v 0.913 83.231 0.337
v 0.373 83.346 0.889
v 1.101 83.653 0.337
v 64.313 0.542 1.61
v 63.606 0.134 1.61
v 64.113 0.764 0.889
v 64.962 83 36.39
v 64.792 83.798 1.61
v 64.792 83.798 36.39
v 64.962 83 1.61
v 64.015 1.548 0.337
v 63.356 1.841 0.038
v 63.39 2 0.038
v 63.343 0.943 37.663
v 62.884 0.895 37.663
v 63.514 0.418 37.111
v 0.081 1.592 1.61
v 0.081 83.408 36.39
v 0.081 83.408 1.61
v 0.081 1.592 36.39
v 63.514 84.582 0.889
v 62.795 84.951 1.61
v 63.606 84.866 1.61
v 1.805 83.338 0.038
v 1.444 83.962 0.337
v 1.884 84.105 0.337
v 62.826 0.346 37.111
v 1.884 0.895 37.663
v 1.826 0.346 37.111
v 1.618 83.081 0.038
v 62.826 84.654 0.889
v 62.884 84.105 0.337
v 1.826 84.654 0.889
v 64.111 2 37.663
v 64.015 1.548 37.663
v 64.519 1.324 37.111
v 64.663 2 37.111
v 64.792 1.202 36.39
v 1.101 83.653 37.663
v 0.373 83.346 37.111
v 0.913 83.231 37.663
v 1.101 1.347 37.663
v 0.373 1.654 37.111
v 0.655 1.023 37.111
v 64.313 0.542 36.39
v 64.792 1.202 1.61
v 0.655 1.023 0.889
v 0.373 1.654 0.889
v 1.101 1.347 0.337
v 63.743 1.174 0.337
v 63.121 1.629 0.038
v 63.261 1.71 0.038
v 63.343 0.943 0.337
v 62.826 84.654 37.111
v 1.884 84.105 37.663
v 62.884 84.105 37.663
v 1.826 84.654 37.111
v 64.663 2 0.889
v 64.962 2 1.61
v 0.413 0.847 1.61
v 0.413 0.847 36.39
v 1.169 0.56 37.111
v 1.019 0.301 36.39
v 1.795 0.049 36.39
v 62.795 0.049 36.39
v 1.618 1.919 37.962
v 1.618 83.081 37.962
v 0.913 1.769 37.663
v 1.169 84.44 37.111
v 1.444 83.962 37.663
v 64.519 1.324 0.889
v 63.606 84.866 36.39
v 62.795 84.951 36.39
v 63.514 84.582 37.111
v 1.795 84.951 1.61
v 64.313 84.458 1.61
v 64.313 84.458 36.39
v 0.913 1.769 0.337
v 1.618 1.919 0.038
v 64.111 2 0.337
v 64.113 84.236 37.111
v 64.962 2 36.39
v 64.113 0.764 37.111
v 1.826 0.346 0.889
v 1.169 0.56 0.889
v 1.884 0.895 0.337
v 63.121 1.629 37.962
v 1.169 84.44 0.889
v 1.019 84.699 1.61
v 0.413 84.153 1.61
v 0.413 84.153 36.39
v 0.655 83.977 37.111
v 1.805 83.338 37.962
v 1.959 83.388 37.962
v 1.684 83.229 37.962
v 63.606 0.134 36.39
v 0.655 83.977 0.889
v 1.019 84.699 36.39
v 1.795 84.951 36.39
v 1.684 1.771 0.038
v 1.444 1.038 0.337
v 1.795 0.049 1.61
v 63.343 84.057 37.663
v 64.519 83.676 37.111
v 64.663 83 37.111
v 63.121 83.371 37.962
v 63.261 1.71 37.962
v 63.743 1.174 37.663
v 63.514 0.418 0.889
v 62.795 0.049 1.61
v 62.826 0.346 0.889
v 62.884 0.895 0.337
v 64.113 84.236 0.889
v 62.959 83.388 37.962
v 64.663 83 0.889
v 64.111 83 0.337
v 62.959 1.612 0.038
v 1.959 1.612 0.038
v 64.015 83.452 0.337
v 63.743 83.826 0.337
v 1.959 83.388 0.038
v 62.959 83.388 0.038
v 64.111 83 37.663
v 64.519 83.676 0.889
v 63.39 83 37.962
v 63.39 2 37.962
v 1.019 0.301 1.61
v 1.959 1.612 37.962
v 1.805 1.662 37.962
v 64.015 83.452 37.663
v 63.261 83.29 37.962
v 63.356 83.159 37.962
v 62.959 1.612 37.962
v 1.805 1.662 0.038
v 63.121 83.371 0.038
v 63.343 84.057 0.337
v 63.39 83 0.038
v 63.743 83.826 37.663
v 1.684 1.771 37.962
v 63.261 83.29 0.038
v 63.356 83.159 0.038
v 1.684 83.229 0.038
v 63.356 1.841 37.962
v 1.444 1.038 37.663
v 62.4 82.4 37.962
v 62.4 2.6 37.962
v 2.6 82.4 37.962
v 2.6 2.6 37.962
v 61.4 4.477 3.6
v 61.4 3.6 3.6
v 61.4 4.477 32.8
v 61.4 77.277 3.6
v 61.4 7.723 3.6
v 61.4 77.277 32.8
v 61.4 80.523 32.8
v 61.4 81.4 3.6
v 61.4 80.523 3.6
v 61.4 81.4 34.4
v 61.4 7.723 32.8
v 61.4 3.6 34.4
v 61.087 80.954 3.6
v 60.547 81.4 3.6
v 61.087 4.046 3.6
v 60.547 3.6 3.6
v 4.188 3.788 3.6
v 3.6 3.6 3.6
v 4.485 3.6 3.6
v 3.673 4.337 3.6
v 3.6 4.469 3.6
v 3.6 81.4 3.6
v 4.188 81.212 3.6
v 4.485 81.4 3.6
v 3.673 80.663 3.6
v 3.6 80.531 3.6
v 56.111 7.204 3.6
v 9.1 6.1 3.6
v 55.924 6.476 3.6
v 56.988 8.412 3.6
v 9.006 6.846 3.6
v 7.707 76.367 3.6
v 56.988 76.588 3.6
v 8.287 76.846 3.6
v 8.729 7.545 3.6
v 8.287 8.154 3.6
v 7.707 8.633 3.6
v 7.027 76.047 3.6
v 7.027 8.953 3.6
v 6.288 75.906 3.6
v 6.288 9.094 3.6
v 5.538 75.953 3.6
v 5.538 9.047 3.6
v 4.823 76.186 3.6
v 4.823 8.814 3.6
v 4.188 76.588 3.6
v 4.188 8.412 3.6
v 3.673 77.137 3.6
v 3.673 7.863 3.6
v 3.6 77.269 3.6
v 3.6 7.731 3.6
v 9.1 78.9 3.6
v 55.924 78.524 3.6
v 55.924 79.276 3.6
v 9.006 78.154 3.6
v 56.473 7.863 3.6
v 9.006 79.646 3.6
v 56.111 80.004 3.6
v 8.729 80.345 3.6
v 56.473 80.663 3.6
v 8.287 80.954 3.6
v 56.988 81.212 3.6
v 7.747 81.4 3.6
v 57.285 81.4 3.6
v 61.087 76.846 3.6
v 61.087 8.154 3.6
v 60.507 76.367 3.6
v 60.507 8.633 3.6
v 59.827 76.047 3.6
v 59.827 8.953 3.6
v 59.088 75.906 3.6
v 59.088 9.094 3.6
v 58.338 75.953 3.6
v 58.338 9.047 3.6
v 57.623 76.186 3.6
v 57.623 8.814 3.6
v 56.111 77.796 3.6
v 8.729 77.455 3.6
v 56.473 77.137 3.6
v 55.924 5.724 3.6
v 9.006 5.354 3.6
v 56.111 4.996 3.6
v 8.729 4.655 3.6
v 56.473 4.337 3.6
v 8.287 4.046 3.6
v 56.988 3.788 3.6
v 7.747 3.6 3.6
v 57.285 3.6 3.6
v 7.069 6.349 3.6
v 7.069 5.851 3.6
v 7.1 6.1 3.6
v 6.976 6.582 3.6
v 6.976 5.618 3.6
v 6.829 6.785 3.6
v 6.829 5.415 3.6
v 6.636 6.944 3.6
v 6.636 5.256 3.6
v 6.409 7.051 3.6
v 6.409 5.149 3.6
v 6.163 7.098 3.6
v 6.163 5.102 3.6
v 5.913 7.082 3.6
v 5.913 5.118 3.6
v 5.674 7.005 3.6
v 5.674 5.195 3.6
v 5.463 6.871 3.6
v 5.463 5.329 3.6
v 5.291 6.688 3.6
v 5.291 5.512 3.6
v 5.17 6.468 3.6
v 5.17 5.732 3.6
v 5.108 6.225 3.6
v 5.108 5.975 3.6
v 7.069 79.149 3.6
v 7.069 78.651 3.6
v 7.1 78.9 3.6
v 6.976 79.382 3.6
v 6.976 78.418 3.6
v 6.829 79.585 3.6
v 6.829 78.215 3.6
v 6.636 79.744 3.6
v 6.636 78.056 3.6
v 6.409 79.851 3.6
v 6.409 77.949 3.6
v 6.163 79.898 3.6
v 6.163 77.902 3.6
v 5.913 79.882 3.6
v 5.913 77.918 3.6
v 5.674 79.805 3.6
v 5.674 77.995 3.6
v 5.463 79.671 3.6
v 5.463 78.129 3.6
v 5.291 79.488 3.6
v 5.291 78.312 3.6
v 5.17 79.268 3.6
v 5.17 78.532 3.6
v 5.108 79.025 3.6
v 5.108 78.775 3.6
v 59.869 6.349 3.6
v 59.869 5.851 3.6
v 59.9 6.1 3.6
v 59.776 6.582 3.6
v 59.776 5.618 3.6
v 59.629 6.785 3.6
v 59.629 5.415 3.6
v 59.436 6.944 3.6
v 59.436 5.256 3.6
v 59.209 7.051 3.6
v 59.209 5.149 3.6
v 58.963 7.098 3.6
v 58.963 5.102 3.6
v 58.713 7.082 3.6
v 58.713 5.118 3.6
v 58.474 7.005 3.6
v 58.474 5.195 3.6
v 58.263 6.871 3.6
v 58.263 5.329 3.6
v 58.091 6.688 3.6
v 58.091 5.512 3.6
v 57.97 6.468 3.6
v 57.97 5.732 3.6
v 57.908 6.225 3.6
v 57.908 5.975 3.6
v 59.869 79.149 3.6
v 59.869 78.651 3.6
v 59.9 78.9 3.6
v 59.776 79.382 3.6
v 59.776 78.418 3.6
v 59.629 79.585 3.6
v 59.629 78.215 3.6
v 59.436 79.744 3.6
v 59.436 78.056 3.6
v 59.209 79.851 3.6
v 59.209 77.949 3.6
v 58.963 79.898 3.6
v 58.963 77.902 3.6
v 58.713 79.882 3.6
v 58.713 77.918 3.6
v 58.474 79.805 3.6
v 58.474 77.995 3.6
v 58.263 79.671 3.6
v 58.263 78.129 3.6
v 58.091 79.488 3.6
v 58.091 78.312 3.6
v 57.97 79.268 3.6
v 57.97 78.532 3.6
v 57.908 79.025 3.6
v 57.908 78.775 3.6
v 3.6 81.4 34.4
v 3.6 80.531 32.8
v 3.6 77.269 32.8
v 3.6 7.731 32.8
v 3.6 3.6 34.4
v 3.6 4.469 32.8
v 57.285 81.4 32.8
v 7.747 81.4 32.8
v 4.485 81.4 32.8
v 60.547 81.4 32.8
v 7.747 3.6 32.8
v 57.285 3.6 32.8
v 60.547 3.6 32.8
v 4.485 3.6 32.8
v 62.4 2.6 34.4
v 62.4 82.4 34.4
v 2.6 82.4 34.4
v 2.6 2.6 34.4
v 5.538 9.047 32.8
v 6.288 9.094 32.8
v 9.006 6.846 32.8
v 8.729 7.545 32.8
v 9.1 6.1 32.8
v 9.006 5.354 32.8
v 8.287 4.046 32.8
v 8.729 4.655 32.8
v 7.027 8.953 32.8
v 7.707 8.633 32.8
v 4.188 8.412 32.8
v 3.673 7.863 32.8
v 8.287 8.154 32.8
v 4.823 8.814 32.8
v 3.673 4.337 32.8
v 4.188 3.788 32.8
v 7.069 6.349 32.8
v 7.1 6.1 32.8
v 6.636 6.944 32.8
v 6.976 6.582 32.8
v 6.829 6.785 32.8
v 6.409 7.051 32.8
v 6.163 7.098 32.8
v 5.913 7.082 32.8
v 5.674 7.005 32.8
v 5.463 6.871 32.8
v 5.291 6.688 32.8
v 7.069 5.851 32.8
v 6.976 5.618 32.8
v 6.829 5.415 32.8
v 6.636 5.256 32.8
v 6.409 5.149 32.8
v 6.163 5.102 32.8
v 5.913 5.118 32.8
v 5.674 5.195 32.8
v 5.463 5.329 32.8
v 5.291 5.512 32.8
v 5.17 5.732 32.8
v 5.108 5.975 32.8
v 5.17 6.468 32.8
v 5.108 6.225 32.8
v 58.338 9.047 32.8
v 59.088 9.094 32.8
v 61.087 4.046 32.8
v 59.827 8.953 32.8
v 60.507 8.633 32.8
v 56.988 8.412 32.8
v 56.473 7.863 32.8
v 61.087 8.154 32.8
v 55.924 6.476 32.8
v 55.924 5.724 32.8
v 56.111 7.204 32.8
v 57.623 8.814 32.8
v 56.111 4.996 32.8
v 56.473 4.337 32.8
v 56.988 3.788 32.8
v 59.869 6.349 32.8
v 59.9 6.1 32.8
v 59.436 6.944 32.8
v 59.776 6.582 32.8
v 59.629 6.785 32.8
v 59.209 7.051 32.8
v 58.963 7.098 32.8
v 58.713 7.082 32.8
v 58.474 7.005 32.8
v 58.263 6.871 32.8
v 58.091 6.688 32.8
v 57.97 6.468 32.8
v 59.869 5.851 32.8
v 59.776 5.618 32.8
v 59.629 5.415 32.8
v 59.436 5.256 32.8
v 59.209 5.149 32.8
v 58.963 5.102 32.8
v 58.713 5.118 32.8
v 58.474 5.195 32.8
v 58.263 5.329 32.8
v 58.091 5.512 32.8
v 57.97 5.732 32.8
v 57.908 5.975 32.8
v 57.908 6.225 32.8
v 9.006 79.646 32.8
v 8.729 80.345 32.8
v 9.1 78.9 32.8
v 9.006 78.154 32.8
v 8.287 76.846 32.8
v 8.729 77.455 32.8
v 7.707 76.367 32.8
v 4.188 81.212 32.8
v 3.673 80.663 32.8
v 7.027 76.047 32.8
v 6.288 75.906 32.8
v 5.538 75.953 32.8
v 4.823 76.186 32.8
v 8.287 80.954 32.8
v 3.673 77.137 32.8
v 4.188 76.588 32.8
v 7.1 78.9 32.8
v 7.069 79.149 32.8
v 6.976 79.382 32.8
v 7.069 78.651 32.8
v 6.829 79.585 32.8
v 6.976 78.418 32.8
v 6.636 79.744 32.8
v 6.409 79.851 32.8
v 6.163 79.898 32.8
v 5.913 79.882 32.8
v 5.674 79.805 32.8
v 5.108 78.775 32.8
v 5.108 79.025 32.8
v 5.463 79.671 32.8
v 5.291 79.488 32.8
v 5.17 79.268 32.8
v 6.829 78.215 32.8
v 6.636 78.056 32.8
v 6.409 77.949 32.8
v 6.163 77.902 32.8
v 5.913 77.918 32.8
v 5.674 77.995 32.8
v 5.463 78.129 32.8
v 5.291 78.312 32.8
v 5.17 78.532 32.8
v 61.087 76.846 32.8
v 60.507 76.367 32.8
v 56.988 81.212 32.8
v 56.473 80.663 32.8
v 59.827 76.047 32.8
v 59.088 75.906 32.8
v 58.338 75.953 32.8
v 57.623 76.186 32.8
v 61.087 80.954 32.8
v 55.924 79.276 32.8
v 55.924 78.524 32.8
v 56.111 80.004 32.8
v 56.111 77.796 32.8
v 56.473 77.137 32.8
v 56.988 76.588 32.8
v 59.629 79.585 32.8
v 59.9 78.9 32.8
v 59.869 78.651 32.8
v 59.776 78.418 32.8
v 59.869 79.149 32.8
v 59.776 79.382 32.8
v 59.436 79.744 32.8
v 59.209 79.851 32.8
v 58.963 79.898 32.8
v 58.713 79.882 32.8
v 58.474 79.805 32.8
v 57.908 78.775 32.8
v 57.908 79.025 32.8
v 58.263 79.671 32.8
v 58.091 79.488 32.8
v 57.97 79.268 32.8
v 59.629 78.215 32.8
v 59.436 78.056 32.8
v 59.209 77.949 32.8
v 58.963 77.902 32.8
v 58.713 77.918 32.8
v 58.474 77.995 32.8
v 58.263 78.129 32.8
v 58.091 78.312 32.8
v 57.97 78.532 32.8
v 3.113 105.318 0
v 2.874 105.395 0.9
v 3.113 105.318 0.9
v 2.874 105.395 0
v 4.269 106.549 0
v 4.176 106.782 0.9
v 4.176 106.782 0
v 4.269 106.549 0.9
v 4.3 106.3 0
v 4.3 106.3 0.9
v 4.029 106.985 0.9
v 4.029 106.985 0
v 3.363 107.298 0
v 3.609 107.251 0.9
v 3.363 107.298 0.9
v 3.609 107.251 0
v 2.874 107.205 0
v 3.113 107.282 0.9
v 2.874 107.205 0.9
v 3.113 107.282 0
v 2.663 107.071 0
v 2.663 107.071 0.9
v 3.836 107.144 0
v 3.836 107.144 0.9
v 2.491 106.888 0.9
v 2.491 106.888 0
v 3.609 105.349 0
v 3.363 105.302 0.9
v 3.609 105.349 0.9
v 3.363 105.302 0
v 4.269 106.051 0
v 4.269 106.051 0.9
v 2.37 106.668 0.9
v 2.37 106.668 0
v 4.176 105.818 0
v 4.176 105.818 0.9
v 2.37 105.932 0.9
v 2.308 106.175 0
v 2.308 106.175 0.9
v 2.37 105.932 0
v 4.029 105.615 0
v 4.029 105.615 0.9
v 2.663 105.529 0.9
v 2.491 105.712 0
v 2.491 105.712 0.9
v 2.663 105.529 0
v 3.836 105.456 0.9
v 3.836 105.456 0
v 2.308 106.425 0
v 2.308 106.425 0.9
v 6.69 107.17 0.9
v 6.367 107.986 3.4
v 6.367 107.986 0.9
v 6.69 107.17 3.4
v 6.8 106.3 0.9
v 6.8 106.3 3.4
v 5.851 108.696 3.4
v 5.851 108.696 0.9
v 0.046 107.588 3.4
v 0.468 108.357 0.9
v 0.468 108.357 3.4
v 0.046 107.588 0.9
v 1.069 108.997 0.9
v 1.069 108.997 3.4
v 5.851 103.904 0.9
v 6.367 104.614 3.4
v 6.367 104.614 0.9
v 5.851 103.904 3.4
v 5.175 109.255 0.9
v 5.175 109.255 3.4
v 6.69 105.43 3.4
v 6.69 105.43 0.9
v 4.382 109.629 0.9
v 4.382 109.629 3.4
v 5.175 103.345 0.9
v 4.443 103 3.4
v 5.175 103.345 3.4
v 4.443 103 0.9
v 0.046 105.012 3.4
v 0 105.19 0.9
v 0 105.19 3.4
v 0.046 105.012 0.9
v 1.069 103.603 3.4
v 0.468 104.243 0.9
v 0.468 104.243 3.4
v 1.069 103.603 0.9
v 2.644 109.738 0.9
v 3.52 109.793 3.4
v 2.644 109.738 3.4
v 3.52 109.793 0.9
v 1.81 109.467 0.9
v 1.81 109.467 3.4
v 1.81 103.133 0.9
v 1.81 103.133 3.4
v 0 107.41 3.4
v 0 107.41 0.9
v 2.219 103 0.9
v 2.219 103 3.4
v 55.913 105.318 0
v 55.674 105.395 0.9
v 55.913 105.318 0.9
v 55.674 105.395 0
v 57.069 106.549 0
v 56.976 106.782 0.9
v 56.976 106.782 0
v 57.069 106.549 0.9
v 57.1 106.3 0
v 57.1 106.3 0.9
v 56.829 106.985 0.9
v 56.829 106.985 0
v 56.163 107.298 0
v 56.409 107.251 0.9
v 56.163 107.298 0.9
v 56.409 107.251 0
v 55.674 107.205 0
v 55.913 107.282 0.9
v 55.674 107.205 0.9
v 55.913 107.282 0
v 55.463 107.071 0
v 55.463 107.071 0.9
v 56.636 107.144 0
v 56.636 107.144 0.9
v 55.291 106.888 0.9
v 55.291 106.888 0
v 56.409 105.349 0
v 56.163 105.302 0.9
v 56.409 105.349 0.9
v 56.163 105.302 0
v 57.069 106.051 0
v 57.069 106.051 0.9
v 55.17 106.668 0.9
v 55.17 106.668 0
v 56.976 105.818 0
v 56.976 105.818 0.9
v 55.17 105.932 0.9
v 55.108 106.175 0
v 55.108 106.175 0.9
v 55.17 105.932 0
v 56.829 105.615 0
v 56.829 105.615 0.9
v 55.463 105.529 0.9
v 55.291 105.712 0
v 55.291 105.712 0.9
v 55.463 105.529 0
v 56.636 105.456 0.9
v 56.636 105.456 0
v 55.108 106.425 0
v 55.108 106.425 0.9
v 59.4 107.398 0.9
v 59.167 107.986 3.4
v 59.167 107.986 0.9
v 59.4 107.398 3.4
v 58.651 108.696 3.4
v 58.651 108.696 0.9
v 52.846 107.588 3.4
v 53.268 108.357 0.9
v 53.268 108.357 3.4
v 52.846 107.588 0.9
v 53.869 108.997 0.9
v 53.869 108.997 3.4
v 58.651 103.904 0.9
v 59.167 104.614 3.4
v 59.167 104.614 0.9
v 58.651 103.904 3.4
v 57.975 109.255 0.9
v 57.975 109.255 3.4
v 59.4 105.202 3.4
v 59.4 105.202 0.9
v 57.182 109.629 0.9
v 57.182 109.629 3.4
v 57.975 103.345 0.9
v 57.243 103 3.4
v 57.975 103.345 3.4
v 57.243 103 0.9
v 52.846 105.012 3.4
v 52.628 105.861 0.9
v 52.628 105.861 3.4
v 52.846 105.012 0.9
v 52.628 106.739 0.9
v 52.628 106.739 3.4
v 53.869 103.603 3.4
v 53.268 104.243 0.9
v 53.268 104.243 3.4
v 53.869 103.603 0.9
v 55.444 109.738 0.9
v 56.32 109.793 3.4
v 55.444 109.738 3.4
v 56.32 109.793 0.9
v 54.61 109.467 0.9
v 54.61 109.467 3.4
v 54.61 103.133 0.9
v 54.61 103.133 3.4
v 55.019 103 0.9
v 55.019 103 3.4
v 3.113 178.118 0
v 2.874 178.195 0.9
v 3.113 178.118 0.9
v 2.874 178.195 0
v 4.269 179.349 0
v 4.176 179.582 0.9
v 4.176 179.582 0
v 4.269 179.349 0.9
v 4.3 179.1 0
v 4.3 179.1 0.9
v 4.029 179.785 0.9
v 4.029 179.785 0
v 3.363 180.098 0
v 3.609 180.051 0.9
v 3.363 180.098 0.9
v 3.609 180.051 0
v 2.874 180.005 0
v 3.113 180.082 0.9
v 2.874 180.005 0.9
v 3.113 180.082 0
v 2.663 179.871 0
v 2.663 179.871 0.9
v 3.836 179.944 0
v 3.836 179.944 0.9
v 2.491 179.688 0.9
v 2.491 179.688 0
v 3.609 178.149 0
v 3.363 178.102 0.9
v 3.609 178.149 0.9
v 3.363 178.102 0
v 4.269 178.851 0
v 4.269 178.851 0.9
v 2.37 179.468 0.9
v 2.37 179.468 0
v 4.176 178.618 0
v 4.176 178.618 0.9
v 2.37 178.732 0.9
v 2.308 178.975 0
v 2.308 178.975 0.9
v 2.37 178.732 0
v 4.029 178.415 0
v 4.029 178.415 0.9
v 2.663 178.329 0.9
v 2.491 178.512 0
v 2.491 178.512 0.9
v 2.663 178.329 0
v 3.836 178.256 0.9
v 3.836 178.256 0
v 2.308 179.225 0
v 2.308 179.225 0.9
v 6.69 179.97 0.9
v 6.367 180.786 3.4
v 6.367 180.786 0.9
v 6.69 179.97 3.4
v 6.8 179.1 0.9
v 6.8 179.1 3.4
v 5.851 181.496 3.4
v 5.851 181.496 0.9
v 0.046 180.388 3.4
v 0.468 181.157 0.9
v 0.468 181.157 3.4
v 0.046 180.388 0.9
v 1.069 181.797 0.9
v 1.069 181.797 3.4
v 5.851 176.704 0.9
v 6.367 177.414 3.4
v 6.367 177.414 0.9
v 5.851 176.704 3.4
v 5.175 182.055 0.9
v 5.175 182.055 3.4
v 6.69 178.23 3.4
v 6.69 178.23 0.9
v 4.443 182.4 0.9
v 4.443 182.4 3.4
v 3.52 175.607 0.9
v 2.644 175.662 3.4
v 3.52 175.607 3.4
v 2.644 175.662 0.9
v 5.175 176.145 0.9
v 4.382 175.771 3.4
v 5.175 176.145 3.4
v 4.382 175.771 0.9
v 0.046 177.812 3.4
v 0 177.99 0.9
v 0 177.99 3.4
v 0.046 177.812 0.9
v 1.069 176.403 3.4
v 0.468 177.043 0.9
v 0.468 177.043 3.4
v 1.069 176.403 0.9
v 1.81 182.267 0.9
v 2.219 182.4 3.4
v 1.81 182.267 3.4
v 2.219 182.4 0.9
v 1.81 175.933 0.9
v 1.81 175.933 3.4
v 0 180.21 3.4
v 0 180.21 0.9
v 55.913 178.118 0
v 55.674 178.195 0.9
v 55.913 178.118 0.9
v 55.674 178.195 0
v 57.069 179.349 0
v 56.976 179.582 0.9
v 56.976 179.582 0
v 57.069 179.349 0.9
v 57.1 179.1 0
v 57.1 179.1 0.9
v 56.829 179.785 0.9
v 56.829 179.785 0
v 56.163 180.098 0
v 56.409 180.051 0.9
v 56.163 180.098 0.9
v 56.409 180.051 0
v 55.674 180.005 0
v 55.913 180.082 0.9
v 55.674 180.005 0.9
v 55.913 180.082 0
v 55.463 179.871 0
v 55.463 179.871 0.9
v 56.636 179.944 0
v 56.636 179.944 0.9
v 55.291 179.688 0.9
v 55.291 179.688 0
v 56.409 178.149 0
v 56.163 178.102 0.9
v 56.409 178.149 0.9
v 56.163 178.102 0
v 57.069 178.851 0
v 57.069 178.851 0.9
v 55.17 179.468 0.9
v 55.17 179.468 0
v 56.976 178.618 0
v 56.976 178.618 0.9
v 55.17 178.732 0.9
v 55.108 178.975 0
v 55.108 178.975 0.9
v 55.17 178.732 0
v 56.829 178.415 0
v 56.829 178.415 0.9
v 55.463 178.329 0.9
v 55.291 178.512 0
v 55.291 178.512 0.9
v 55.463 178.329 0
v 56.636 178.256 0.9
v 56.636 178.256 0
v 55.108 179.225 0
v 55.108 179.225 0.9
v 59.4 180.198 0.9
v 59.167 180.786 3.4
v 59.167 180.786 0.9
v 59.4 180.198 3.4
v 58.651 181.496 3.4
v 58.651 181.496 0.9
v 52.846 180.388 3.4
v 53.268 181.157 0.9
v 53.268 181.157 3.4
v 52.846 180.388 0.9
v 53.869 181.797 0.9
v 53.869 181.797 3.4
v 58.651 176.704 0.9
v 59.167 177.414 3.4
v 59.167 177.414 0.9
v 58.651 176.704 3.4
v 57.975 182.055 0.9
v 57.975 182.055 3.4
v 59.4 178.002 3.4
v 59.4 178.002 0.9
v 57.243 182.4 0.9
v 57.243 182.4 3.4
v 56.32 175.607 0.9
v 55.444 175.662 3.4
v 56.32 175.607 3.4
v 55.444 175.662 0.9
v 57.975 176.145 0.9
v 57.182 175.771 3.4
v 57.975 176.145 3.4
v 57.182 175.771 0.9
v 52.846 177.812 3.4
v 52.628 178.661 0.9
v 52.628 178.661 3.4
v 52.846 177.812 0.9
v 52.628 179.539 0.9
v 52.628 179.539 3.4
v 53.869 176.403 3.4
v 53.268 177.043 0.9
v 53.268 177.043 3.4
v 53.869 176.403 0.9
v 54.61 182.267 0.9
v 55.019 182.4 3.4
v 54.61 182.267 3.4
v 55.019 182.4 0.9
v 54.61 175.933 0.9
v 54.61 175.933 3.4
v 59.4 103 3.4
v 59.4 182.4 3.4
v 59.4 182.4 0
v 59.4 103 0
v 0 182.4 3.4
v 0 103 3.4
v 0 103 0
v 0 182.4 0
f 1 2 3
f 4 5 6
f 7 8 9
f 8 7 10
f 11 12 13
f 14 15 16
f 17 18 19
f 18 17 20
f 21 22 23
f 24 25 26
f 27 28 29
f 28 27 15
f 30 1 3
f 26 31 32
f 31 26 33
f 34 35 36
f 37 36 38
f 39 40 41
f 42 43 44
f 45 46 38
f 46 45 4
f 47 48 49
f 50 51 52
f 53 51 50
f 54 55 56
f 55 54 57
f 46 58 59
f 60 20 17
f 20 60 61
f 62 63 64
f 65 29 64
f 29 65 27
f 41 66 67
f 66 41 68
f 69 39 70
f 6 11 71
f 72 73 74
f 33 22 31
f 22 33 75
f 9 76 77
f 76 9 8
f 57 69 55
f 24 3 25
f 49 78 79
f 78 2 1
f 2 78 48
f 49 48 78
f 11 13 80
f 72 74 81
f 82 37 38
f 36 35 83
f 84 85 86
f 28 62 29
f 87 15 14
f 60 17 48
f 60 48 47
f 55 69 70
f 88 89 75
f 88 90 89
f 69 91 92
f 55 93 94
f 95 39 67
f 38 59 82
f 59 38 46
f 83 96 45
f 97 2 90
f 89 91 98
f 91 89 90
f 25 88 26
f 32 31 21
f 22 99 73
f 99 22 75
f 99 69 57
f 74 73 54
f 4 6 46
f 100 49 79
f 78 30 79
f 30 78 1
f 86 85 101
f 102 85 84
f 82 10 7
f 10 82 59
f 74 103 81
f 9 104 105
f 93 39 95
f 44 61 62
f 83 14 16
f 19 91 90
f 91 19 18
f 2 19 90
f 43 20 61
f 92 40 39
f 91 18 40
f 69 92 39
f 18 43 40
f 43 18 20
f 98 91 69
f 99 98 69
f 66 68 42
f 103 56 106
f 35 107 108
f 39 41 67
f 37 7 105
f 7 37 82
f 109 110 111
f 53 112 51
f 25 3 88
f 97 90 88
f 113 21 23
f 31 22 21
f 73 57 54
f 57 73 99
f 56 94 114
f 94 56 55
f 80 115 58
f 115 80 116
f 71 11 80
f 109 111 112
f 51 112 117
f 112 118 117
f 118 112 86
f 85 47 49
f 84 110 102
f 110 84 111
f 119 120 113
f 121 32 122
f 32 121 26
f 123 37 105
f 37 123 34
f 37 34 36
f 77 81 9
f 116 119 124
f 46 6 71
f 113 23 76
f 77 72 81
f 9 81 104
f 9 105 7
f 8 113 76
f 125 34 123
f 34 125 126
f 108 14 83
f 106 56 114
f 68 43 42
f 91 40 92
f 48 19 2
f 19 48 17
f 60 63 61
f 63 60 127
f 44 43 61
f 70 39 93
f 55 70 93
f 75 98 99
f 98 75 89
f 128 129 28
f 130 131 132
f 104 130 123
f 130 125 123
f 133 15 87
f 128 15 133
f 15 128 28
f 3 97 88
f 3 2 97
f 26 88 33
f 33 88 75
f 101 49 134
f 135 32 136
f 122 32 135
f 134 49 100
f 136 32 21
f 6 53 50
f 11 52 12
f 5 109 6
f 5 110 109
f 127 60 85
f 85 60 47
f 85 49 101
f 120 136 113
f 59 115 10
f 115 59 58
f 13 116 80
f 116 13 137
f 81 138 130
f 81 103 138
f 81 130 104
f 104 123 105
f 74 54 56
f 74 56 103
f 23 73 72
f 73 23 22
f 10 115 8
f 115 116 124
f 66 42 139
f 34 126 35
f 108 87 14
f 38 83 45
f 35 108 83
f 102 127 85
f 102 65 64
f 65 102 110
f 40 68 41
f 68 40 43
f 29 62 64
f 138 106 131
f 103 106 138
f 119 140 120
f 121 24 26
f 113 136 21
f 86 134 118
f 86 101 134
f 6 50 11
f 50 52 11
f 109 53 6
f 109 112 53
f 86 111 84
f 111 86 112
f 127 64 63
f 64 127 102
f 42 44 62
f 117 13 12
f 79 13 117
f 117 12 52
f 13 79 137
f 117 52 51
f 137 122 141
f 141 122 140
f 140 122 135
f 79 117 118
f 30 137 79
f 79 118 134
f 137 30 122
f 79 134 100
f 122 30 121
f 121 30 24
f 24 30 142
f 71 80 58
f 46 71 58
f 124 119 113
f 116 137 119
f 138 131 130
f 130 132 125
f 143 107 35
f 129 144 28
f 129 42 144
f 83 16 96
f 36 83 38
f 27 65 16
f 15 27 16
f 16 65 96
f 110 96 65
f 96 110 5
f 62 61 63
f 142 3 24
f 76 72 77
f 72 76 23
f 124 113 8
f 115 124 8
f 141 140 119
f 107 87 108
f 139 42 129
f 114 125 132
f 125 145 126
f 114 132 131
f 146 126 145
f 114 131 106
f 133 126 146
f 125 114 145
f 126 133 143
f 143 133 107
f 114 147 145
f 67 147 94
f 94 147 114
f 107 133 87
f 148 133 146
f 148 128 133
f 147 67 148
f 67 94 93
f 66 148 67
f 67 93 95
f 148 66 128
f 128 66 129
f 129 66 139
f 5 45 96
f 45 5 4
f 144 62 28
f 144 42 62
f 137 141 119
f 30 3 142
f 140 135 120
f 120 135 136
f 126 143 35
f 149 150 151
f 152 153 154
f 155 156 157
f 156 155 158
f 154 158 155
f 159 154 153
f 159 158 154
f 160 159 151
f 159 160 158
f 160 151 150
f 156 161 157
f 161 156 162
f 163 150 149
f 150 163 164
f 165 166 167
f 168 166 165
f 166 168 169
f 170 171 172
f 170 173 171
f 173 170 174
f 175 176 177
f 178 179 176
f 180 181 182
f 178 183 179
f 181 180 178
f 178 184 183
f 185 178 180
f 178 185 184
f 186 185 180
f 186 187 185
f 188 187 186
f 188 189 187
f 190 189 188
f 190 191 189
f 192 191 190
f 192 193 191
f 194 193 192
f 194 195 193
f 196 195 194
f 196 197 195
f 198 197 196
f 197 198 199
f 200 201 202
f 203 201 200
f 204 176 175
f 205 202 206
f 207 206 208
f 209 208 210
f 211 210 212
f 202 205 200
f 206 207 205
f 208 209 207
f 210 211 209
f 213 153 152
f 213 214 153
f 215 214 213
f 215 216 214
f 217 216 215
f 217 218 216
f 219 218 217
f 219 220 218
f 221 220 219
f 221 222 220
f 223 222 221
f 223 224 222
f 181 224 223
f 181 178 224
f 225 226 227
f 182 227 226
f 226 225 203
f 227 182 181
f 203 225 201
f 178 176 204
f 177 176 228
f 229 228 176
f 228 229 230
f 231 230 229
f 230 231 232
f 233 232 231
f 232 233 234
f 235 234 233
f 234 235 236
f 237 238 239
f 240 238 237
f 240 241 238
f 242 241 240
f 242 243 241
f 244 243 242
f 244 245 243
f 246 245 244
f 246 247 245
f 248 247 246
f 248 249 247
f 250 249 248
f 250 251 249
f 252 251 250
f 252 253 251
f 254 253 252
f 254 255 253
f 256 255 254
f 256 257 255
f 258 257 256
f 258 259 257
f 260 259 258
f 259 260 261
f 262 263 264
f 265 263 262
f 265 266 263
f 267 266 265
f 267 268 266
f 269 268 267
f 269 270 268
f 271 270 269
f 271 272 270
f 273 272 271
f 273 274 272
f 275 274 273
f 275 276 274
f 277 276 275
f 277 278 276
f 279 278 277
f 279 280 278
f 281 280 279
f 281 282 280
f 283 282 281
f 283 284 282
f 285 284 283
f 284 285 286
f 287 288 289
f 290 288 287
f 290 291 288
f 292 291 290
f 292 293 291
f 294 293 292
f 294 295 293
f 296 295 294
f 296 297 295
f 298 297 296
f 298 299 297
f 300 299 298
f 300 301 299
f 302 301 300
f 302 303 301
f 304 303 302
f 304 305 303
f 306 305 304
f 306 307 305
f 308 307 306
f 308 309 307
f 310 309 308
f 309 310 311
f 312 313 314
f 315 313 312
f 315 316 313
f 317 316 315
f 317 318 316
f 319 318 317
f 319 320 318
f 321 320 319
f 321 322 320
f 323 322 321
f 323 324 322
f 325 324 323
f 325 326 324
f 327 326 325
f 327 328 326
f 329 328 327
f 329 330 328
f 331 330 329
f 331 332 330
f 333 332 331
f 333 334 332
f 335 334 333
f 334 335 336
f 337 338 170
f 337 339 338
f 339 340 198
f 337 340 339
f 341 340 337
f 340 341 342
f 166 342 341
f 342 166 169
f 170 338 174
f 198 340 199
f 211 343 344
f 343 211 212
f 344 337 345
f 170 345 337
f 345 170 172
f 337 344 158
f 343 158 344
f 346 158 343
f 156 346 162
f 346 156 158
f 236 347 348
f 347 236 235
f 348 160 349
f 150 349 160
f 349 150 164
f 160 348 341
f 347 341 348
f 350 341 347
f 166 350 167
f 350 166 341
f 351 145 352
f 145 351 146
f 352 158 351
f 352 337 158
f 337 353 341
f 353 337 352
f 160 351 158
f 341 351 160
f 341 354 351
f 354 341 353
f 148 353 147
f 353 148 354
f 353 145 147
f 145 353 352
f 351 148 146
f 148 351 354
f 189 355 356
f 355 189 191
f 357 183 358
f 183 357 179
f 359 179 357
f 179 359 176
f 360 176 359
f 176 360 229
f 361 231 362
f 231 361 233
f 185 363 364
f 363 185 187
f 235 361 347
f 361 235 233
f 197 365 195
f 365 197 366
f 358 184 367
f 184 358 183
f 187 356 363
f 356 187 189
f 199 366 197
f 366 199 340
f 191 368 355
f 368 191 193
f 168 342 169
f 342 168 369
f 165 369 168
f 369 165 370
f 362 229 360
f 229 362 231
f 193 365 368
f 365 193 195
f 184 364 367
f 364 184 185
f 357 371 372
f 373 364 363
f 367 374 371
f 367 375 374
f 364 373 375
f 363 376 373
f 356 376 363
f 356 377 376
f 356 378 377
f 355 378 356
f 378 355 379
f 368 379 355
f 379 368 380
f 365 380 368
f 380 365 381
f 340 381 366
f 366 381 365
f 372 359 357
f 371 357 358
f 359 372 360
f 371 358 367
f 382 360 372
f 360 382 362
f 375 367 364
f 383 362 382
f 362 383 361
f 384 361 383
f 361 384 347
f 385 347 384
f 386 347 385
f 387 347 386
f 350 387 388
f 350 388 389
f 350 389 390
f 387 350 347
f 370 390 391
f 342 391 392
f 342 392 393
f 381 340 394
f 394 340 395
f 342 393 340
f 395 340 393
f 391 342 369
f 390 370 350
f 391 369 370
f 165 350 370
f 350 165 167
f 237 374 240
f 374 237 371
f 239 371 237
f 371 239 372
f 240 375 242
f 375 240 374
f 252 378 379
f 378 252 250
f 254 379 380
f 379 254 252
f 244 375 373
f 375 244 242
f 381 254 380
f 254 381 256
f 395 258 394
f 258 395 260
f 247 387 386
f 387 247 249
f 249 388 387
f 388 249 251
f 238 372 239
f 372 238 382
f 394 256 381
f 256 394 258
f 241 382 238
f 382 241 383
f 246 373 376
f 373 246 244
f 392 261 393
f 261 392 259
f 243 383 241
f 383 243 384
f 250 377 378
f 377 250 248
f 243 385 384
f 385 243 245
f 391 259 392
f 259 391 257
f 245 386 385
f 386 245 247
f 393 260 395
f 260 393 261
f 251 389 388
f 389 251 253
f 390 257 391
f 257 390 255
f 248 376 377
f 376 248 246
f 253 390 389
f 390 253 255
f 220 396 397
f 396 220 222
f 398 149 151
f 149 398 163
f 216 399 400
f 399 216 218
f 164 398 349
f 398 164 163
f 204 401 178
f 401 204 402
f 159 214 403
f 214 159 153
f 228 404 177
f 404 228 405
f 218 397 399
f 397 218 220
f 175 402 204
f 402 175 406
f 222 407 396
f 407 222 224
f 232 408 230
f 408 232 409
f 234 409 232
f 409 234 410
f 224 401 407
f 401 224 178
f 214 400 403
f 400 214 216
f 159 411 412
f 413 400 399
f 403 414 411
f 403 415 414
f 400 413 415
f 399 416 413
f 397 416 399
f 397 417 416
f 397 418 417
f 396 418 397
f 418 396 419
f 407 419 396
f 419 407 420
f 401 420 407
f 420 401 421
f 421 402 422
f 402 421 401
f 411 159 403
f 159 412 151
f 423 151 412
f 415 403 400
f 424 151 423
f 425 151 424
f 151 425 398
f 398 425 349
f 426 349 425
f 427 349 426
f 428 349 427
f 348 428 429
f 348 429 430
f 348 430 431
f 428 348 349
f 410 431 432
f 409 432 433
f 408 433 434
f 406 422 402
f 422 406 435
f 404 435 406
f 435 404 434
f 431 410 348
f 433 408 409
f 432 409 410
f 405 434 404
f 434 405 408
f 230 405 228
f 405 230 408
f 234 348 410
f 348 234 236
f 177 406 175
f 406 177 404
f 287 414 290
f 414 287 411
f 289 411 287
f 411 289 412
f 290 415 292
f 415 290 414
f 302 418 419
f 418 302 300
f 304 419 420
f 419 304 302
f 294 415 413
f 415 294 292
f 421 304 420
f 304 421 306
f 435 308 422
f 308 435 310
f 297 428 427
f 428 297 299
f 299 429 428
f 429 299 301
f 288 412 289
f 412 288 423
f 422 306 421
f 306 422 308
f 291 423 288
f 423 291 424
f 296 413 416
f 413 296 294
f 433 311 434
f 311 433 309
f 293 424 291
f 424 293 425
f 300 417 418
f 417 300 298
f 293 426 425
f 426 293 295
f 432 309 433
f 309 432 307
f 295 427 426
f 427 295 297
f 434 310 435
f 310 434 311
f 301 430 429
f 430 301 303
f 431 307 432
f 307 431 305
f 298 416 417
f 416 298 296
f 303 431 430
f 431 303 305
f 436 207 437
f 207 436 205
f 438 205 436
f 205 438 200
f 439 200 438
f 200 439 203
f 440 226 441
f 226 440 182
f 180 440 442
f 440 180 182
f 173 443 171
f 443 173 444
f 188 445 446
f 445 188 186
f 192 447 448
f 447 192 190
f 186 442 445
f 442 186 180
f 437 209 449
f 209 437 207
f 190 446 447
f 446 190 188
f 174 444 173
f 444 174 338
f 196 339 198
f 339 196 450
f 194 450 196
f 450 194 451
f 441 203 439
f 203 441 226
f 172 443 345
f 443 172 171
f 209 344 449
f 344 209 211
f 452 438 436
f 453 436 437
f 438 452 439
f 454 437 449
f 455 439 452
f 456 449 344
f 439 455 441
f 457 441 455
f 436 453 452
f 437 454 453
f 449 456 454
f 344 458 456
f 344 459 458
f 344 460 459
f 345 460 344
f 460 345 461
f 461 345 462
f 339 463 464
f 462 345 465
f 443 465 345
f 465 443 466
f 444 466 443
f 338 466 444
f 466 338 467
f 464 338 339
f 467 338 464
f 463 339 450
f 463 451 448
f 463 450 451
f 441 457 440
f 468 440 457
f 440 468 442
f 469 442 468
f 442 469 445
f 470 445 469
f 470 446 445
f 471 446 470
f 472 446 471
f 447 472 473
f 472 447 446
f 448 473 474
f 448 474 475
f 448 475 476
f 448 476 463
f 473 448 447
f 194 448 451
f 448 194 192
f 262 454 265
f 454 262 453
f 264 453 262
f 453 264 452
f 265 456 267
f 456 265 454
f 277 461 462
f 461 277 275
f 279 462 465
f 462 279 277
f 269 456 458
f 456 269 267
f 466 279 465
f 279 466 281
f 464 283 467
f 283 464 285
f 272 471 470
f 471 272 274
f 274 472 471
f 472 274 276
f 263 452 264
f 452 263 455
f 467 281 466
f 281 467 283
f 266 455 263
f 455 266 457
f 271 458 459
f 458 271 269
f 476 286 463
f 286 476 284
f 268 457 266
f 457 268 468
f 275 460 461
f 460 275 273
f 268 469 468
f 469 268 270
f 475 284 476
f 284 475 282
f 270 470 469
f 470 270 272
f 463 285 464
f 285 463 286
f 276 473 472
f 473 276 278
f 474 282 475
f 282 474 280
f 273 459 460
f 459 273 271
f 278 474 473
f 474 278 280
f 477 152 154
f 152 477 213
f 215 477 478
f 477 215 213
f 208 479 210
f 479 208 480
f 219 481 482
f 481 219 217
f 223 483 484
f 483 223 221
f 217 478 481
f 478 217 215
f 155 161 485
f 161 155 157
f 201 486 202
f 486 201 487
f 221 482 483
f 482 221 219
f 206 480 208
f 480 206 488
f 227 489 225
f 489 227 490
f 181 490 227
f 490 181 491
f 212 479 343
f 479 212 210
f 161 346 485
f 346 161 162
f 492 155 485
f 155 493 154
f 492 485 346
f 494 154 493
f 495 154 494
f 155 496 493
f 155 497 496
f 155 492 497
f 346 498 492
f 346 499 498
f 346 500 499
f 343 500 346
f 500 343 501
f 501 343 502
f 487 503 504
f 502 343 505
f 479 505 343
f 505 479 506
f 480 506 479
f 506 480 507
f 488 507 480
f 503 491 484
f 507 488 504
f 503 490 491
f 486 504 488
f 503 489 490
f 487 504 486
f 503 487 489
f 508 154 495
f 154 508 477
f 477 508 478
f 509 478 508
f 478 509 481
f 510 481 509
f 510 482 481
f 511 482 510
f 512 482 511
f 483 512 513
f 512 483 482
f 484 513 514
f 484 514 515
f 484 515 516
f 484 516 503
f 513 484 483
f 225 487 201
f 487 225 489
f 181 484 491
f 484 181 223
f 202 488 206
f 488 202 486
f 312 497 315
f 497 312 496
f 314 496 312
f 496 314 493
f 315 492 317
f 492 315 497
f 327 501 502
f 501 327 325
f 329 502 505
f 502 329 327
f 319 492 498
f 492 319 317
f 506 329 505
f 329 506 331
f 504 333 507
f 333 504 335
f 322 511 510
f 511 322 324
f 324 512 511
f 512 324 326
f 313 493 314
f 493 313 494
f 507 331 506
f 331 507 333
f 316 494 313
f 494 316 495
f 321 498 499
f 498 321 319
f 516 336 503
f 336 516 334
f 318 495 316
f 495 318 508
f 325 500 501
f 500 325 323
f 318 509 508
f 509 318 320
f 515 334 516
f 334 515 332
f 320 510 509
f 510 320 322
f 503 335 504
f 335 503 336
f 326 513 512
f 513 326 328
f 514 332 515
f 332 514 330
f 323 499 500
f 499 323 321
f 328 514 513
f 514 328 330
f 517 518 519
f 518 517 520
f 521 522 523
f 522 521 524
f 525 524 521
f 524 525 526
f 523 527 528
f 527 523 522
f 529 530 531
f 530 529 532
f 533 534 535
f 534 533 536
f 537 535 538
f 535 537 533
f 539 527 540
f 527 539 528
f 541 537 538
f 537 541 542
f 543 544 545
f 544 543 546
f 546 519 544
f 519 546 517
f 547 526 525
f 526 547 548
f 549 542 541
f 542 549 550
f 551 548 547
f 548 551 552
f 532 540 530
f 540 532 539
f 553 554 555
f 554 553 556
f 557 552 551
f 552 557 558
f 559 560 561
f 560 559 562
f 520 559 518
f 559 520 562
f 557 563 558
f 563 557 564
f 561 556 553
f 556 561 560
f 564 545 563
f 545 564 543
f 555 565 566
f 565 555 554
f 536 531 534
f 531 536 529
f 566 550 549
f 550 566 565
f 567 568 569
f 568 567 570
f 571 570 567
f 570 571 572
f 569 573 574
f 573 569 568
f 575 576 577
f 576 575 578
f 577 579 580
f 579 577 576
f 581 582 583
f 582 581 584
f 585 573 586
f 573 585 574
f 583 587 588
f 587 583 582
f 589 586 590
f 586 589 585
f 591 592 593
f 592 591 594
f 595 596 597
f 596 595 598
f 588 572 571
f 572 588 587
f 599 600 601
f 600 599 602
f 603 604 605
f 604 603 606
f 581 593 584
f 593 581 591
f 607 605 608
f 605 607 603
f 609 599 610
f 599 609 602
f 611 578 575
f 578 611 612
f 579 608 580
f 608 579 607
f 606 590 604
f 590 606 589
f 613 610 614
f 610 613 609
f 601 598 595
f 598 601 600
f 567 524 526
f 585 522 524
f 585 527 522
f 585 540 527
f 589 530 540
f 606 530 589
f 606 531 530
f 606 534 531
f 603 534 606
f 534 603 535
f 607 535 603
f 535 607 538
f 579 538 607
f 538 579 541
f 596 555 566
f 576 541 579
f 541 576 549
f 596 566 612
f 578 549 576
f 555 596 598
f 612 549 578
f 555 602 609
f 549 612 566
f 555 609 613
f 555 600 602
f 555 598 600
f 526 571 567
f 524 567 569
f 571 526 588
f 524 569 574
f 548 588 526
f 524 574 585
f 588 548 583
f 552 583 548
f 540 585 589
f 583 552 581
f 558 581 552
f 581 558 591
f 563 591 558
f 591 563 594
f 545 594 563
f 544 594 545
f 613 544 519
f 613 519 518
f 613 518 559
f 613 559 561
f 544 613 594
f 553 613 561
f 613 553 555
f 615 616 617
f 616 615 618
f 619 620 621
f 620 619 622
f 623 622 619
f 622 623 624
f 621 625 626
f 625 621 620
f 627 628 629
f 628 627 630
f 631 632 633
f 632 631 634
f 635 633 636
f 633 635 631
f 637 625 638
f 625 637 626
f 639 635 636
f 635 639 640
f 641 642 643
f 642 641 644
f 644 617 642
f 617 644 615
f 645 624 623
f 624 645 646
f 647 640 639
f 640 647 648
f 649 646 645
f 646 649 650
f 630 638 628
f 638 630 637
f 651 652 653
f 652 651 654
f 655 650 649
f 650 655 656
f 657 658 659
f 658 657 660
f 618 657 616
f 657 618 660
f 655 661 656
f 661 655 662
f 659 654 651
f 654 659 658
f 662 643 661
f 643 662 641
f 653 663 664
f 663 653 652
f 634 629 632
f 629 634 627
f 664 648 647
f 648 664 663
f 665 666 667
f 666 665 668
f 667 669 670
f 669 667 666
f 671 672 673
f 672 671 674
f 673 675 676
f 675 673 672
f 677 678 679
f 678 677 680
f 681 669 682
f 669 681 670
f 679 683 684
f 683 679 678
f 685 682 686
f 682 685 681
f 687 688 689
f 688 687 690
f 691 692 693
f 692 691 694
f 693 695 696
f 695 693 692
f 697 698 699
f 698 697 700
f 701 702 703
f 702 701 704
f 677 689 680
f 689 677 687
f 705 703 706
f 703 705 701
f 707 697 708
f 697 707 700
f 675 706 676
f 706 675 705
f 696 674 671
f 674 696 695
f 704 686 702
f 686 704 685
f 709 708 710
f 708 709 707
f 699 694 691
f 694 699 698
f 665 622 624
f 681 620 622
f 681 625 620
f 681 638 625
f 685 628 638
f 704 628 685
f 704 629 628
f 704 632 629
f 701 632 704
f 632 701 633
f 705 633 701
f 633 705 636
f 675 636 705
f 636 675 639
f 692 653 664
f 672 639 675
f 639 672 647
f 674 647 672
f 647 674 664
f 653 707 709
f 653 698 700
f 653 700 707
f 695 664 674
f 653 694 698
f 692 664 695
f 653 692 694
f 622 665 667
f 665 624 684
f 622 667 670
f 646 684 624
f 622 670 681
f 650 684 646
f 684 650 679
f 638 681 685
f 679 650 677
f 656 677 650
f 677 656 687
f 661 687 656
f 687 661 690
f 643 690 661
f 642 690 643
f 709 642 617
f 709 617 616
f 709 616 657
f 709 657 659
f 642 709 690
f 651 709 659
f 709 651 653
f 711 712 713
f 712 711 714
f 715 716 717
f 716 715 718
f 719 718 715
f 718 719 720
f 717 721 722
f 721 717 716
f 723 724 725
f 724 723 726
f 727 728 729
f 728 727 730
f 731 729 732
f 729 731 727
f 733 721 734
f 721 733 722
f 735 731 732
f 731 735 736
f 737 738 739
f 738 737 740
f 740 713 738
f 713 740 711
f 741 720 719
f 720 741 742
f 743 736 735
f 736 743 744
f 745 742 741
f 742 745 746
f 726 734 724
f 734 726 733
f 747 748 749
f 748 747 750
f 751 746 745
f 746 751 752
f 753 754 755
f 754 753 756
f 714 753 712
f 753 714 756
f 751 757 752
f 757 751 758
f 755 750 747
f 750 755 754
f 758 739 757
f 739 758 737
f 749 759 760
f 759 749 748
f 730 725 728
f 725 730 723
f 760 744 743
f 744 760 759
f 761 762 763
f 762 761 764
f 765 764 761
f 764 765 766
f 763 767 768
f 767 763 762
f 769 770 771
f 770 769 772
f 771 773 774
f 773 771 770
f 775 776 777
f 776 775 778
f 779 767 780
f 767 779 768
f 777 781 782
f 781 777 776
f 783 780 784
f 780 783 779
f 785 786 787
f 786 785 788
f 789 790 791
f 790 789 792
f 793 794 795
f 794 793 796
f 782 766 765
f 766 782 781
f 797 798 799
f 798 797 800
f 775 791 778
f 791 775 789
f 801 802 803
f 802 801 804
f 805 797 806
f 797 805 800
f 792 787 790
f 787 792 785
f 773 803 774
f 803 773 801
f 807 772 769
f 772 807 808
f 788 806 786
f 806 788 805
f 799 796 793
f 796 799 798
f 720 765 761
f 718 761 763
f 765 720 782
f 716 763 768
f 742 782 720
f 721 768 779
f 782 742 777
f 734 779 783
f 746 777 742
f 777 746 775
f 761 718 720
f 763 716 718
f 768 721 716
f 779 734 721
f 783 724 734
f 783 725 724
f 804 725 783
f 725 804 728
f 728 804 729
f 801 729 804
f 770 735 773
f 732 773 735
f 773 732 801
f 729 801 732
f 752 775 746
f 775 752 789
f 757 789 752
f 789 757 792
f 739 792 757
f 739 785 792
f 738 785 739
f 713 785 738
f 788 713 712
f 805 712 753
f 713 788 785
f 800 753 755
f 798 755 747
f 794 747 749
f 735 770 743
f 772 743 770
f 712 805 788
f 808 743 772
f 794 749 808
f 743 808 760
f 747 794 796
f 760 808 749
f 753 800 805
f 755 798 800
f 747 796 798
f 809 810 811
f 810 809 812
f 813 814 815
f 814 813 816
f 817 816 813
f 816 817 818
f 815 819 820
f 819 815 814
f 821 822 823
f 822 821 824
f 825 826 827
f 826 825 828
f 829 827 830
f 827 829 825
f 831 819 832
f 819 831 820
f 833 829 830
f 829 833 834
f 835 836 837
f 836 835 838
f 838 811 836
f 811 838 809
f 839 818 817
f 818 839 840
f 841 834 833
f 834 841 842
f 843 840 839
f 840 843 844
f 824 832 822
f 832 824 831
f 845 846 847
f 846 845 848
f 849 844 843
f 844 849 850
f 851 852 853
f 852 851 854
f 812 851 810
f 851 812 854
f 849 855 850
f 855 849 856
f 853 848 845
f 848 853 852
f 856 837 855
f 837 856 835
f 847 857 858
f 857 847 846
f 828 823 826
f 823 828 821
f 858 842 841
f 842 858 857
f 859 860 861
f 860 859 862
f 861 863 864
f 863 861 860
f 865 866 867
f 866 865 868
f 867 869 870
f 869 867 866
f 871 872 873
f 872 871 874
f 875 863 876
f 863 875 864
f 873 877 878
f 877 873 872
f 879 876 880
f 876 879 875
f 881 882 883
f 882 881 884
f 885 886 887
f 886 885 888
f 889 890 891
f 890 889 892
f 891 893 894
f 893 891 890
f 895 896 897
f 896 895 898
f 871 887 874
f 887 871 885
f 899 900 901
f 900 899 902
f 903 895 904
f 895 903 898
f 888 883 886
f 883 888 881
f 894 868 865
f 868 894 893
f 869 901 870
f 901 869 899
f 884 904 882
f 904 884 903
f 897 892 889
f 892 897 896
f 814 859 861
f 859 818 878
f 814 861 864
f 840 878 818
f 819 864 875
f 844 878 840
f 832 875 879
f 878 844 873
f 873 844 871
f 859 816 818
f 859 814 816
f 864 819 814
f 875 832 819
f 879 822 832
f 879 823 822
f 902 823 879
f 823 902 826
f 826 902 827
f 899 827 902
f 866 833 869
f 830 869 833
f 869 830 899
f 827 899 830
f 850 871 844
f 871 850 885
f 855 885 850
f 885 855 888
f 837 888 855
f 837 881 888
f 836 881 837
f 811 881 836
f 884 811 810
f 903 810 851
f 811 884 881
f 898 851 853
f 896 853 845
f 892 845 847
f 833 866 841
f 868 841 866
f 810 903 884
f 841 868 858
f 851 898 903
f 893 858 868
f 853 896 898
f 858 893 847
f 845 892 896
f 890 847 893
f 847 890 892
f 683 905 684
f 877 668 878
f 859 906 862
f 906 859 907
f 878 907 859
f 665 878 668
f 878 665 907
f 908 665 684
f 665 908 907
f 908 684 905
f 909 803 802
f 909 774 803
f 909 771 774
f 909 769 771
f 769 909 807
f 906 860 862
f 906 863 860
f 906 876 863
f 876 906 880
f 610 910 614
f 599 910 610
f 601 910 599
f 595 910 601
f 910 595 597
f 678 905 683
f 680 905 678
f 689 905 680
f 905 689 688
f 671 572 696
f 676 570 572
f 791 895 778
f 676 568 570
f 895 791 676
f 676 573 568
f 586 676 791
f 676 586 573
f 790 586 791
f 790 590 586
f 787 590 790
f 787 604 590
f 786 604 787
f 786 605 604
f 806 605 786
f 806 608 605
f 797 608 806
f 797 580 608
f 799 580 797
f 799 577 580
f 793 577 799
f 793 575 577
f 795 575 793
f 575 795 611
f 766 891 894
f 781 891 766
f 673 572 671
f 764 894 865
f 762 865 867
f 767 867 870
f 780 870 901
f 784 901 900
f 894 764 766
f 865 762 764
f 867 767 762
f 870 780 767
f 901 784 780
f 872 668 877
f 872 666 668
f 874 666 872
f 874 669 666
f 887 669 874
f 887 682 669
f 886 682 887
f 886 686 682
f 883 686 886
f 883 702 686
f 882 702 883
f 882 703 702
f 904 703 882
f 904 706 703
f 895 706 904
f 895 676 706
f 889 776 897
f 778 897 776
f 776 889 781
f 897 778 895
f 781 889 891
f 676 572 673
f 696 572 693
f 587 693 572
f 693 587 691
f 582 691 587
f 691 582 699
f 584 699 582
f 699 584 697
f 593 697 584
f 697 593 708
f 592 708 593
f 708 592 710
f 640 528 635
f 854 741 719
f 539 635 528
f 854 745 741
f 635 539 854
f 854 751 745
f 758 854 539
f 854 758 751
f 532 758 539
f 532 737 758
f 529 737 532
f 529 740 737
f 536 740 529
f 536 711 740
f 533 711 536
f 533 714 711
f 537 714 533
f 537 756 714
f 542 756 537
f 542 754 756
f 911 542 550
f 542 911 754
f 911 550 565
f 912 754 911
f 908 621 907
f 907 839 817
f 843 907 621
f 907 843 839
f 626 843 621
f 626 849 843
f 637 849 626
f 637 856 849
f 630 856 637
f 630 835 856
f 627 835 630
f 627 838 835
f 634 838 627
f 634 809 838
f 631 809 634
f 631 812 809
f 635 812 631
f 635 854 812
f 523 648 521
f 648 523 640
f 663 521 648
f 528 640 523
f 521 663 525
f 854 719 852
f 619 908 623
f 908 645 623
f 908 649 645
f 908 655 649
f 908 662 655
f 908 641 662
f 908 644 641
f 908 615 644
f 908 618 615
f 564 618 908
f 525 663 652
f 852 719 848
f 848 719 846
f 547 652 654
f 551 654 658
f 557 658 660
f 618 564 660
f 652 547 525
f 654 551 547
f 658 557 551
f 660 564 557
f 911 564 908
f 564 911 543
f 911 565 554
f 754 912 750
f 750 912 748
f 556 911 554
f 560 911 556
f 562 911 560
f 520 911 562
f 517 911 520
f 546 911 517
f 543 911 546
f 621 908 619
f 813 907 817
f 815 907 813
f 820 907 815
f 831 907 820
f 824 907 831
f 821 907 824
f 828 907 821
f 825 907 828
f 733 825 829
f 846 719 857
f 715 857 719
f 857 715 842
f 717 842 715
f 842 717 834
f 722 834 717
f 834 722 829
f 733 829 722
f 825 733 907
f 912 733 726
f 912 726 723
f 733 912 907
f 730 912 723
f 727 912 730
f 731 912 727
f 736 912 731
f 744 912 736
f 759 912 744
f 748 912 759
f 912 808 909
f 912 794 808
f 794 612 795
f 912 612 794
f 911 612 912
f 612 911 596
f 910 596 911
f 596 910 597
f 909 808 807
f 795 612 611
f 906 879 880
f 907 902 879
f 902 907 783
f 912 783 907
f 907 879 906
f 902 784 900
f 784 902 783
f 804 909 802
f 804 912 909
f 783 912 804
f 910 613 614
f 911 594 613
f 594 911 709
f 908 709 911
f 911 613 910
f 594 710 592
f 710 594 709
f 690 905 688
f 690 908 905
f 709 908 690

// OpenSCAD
/* [Outer Dimensions] */
//Width of the Box in mm
outer_width = 65; 	// [0:0.1:500]
//outer_length of the Box in mm
outer_length = 85; // [0:0.1:500]
//Height of the Box in mm
outer_height = 38;	// [0:0.1:500]

/* [Wall Settings] */
//Wallthickness in mm 
wall = 3.6; 	// [0:0.1:25]
//Radius of rounded Corner
corner = 2;	// [0:0.1:20]
//Gap between sides of case and Bottom in mm
gap_xy = 0.2; 	// [0:0.05:2]
//Gap between lip of case and Bottom in mm
gap_z = 0.2; 	// [0:0.05:2]

/* [Hole Settings] */
//Threaddiameter in mm 
screw_hole = 2; // [0:0.1:20]
//Wall thickness of screwpost in mm 
screw_wall_thickness = 2; // [0:0.1:20]
//Diameter of Screw Head in mm
screw_head = 7; // [0:0.1:50]
//Distance from Hole to Wall in mm
hole_distance = 1.5; // [0:0.1:50]
//Thickness of Circuit Board to be sandwiched between Case and Bottom in mm
pcb_height = 1.6; // [0:0.1:15]
//Step between Case and Bottom in mm
step = 1; 	// [0:0.1:10]

/* [Quality] */
//Quality (simply experiment) 
Quality = 25;	// [1:100]

$fn = Quality;
case(outer_width, outer_length,	outer_height, wall, corner, gap_xy, gap_z, screw_hole,
	screw_wall_thickness, screw_head, pcb_height, hole_distance, step, Quality);
	
//Case with rounded corners, screwholes and bottom
module case
(
	outer_width = 35, 
	outer_length = 45,
	outer_height = 38, 
	wall = 3.6, 
	corner = 2, 
	gap_xy = 0.2,
	gap_z = 1,
	screw_hole = 2,
	screw_wall_thickness = 2,
	screw_head = 7, 
	pcb_height = 0, 
	hole_distance = 1.5, 
	step = 1.5,
	quality = 25
)
{
    $fn = quality;
	
    //case
    union()
    {
        difference()
        {
            translate([corner, corner, corner])
            {
                minkowski()
                {   
                    cube([outer_width - 2*corner, outer_length - 2*corner, outer_height - 2*corner], false);
                    $fn = 15;
                    sphere(corner);
                }        
            }
			
            translate([wall, wall, wall])
            {
                cube([outer_width - 2*wall, outer_length - 2*wall, outer_height + corner], false);
            }
			
			translate([wall - step, wall - step, outer_height - wall])
            {
                cube([outer_width + 2*step - 2*wall, outer_length + 2*step - 2*wall, 2*wall], false);
            } 			
        }
    
        if(screw_hole > 0)
            {
                h_offset = wall + hole_distance + screw_hole/2;
                h_height = outer_height - 2 * wall - pcb_height + 0.1;
                dia = screw_hole + screw_wall_thickness*2;
                
                translate([h_offset, h_offset, wall - 0.1])
                {                                        
                    difference()
                    {
                        cylinder(h_height, d = dia);
                        cylinder(outer_height, d = screw_hole);
                    }
                }
                
                translate([outer_width - h_offset, h_offset, wall - 0.1])
                {                                  
                    difference()
                    {
                        cylinder(h_height, d = dia);
                        cylinder(outer_height, d = screw_hole);
                    }
                }
                
                translate([h_offset, outer_length - h_offset, wall - 0.1])
                {                                        
                    difference()
                    {
                        cylinder(h_height, d = dia);
                        cylinder(outer_height, d = screw_hole);
                    }
                }
                
                translate([outer_width - h_offset, outer_length - h_offset, wall - 0.1])
                {                    
                    difference()
                    {
                        cylinder(h_height, d = dia);
                        cylinder(outer_height, d = screw_hole);
                    }
                }
            }    
    }
    
    
    //Bottom
    //#translate([wall - step + gap_xy, wall - step + gap_xy, height - wall + gap_z]) //Mounted Pos
	translate([0, outer_length + 5*wall, 0]) //Printing Pos
    {
        difference()
        {
			cube_x = outer_width + 2*(step - wall - gap_xy);
			cube_y = outer_length + 2*(step - wall - gap_xy);
			
            cube([cube_x, cube_y, wall - gap_z], false);
        
            if(screw_hole > 0)
            {
                b_h_offset = step + screw_hole/2 - gap_xy + hole_distance;
                b_width = outer_width - 2 * wall;
                b_depth = outer_length - 2 * wall;
                h_depth = wall * (1/4);
                
                
                translate([b_h_offset, b_h_offset, -1])
                {
                    cylinder(wall + 2, d = screw_hole);
					translate([0, 0, 1 + h_depth])cylinder(wall, d = screw_head);
                }
				
                translate([cube_x - b_h_offset, b_h_offset, -1])
                {
                    cylinder(wall + 2, d = screw_hole);
					translate([0, 0, 1 + h_depth])cylinder(wall, d = screw_head);
                }	
                translate([b_h_offset, cube_y - b_h_offset, -1])
                {
                    cylinder(wall + 2, d = screw_hole);
					translate([0, 0, 1 + h_depth])cylinder(wall, d = screw_head);
                }
				
                translate([cube_x - b_h_offset, cube_y - b_h_offset, -1])
                {
                    cylinder(wall + 2, d = screw_hole);
					translate([0, 0, 1 + h_depth])cylinder(wall, d = screw_head);
                }				
                 
                    
            }
        }
    }   
}
